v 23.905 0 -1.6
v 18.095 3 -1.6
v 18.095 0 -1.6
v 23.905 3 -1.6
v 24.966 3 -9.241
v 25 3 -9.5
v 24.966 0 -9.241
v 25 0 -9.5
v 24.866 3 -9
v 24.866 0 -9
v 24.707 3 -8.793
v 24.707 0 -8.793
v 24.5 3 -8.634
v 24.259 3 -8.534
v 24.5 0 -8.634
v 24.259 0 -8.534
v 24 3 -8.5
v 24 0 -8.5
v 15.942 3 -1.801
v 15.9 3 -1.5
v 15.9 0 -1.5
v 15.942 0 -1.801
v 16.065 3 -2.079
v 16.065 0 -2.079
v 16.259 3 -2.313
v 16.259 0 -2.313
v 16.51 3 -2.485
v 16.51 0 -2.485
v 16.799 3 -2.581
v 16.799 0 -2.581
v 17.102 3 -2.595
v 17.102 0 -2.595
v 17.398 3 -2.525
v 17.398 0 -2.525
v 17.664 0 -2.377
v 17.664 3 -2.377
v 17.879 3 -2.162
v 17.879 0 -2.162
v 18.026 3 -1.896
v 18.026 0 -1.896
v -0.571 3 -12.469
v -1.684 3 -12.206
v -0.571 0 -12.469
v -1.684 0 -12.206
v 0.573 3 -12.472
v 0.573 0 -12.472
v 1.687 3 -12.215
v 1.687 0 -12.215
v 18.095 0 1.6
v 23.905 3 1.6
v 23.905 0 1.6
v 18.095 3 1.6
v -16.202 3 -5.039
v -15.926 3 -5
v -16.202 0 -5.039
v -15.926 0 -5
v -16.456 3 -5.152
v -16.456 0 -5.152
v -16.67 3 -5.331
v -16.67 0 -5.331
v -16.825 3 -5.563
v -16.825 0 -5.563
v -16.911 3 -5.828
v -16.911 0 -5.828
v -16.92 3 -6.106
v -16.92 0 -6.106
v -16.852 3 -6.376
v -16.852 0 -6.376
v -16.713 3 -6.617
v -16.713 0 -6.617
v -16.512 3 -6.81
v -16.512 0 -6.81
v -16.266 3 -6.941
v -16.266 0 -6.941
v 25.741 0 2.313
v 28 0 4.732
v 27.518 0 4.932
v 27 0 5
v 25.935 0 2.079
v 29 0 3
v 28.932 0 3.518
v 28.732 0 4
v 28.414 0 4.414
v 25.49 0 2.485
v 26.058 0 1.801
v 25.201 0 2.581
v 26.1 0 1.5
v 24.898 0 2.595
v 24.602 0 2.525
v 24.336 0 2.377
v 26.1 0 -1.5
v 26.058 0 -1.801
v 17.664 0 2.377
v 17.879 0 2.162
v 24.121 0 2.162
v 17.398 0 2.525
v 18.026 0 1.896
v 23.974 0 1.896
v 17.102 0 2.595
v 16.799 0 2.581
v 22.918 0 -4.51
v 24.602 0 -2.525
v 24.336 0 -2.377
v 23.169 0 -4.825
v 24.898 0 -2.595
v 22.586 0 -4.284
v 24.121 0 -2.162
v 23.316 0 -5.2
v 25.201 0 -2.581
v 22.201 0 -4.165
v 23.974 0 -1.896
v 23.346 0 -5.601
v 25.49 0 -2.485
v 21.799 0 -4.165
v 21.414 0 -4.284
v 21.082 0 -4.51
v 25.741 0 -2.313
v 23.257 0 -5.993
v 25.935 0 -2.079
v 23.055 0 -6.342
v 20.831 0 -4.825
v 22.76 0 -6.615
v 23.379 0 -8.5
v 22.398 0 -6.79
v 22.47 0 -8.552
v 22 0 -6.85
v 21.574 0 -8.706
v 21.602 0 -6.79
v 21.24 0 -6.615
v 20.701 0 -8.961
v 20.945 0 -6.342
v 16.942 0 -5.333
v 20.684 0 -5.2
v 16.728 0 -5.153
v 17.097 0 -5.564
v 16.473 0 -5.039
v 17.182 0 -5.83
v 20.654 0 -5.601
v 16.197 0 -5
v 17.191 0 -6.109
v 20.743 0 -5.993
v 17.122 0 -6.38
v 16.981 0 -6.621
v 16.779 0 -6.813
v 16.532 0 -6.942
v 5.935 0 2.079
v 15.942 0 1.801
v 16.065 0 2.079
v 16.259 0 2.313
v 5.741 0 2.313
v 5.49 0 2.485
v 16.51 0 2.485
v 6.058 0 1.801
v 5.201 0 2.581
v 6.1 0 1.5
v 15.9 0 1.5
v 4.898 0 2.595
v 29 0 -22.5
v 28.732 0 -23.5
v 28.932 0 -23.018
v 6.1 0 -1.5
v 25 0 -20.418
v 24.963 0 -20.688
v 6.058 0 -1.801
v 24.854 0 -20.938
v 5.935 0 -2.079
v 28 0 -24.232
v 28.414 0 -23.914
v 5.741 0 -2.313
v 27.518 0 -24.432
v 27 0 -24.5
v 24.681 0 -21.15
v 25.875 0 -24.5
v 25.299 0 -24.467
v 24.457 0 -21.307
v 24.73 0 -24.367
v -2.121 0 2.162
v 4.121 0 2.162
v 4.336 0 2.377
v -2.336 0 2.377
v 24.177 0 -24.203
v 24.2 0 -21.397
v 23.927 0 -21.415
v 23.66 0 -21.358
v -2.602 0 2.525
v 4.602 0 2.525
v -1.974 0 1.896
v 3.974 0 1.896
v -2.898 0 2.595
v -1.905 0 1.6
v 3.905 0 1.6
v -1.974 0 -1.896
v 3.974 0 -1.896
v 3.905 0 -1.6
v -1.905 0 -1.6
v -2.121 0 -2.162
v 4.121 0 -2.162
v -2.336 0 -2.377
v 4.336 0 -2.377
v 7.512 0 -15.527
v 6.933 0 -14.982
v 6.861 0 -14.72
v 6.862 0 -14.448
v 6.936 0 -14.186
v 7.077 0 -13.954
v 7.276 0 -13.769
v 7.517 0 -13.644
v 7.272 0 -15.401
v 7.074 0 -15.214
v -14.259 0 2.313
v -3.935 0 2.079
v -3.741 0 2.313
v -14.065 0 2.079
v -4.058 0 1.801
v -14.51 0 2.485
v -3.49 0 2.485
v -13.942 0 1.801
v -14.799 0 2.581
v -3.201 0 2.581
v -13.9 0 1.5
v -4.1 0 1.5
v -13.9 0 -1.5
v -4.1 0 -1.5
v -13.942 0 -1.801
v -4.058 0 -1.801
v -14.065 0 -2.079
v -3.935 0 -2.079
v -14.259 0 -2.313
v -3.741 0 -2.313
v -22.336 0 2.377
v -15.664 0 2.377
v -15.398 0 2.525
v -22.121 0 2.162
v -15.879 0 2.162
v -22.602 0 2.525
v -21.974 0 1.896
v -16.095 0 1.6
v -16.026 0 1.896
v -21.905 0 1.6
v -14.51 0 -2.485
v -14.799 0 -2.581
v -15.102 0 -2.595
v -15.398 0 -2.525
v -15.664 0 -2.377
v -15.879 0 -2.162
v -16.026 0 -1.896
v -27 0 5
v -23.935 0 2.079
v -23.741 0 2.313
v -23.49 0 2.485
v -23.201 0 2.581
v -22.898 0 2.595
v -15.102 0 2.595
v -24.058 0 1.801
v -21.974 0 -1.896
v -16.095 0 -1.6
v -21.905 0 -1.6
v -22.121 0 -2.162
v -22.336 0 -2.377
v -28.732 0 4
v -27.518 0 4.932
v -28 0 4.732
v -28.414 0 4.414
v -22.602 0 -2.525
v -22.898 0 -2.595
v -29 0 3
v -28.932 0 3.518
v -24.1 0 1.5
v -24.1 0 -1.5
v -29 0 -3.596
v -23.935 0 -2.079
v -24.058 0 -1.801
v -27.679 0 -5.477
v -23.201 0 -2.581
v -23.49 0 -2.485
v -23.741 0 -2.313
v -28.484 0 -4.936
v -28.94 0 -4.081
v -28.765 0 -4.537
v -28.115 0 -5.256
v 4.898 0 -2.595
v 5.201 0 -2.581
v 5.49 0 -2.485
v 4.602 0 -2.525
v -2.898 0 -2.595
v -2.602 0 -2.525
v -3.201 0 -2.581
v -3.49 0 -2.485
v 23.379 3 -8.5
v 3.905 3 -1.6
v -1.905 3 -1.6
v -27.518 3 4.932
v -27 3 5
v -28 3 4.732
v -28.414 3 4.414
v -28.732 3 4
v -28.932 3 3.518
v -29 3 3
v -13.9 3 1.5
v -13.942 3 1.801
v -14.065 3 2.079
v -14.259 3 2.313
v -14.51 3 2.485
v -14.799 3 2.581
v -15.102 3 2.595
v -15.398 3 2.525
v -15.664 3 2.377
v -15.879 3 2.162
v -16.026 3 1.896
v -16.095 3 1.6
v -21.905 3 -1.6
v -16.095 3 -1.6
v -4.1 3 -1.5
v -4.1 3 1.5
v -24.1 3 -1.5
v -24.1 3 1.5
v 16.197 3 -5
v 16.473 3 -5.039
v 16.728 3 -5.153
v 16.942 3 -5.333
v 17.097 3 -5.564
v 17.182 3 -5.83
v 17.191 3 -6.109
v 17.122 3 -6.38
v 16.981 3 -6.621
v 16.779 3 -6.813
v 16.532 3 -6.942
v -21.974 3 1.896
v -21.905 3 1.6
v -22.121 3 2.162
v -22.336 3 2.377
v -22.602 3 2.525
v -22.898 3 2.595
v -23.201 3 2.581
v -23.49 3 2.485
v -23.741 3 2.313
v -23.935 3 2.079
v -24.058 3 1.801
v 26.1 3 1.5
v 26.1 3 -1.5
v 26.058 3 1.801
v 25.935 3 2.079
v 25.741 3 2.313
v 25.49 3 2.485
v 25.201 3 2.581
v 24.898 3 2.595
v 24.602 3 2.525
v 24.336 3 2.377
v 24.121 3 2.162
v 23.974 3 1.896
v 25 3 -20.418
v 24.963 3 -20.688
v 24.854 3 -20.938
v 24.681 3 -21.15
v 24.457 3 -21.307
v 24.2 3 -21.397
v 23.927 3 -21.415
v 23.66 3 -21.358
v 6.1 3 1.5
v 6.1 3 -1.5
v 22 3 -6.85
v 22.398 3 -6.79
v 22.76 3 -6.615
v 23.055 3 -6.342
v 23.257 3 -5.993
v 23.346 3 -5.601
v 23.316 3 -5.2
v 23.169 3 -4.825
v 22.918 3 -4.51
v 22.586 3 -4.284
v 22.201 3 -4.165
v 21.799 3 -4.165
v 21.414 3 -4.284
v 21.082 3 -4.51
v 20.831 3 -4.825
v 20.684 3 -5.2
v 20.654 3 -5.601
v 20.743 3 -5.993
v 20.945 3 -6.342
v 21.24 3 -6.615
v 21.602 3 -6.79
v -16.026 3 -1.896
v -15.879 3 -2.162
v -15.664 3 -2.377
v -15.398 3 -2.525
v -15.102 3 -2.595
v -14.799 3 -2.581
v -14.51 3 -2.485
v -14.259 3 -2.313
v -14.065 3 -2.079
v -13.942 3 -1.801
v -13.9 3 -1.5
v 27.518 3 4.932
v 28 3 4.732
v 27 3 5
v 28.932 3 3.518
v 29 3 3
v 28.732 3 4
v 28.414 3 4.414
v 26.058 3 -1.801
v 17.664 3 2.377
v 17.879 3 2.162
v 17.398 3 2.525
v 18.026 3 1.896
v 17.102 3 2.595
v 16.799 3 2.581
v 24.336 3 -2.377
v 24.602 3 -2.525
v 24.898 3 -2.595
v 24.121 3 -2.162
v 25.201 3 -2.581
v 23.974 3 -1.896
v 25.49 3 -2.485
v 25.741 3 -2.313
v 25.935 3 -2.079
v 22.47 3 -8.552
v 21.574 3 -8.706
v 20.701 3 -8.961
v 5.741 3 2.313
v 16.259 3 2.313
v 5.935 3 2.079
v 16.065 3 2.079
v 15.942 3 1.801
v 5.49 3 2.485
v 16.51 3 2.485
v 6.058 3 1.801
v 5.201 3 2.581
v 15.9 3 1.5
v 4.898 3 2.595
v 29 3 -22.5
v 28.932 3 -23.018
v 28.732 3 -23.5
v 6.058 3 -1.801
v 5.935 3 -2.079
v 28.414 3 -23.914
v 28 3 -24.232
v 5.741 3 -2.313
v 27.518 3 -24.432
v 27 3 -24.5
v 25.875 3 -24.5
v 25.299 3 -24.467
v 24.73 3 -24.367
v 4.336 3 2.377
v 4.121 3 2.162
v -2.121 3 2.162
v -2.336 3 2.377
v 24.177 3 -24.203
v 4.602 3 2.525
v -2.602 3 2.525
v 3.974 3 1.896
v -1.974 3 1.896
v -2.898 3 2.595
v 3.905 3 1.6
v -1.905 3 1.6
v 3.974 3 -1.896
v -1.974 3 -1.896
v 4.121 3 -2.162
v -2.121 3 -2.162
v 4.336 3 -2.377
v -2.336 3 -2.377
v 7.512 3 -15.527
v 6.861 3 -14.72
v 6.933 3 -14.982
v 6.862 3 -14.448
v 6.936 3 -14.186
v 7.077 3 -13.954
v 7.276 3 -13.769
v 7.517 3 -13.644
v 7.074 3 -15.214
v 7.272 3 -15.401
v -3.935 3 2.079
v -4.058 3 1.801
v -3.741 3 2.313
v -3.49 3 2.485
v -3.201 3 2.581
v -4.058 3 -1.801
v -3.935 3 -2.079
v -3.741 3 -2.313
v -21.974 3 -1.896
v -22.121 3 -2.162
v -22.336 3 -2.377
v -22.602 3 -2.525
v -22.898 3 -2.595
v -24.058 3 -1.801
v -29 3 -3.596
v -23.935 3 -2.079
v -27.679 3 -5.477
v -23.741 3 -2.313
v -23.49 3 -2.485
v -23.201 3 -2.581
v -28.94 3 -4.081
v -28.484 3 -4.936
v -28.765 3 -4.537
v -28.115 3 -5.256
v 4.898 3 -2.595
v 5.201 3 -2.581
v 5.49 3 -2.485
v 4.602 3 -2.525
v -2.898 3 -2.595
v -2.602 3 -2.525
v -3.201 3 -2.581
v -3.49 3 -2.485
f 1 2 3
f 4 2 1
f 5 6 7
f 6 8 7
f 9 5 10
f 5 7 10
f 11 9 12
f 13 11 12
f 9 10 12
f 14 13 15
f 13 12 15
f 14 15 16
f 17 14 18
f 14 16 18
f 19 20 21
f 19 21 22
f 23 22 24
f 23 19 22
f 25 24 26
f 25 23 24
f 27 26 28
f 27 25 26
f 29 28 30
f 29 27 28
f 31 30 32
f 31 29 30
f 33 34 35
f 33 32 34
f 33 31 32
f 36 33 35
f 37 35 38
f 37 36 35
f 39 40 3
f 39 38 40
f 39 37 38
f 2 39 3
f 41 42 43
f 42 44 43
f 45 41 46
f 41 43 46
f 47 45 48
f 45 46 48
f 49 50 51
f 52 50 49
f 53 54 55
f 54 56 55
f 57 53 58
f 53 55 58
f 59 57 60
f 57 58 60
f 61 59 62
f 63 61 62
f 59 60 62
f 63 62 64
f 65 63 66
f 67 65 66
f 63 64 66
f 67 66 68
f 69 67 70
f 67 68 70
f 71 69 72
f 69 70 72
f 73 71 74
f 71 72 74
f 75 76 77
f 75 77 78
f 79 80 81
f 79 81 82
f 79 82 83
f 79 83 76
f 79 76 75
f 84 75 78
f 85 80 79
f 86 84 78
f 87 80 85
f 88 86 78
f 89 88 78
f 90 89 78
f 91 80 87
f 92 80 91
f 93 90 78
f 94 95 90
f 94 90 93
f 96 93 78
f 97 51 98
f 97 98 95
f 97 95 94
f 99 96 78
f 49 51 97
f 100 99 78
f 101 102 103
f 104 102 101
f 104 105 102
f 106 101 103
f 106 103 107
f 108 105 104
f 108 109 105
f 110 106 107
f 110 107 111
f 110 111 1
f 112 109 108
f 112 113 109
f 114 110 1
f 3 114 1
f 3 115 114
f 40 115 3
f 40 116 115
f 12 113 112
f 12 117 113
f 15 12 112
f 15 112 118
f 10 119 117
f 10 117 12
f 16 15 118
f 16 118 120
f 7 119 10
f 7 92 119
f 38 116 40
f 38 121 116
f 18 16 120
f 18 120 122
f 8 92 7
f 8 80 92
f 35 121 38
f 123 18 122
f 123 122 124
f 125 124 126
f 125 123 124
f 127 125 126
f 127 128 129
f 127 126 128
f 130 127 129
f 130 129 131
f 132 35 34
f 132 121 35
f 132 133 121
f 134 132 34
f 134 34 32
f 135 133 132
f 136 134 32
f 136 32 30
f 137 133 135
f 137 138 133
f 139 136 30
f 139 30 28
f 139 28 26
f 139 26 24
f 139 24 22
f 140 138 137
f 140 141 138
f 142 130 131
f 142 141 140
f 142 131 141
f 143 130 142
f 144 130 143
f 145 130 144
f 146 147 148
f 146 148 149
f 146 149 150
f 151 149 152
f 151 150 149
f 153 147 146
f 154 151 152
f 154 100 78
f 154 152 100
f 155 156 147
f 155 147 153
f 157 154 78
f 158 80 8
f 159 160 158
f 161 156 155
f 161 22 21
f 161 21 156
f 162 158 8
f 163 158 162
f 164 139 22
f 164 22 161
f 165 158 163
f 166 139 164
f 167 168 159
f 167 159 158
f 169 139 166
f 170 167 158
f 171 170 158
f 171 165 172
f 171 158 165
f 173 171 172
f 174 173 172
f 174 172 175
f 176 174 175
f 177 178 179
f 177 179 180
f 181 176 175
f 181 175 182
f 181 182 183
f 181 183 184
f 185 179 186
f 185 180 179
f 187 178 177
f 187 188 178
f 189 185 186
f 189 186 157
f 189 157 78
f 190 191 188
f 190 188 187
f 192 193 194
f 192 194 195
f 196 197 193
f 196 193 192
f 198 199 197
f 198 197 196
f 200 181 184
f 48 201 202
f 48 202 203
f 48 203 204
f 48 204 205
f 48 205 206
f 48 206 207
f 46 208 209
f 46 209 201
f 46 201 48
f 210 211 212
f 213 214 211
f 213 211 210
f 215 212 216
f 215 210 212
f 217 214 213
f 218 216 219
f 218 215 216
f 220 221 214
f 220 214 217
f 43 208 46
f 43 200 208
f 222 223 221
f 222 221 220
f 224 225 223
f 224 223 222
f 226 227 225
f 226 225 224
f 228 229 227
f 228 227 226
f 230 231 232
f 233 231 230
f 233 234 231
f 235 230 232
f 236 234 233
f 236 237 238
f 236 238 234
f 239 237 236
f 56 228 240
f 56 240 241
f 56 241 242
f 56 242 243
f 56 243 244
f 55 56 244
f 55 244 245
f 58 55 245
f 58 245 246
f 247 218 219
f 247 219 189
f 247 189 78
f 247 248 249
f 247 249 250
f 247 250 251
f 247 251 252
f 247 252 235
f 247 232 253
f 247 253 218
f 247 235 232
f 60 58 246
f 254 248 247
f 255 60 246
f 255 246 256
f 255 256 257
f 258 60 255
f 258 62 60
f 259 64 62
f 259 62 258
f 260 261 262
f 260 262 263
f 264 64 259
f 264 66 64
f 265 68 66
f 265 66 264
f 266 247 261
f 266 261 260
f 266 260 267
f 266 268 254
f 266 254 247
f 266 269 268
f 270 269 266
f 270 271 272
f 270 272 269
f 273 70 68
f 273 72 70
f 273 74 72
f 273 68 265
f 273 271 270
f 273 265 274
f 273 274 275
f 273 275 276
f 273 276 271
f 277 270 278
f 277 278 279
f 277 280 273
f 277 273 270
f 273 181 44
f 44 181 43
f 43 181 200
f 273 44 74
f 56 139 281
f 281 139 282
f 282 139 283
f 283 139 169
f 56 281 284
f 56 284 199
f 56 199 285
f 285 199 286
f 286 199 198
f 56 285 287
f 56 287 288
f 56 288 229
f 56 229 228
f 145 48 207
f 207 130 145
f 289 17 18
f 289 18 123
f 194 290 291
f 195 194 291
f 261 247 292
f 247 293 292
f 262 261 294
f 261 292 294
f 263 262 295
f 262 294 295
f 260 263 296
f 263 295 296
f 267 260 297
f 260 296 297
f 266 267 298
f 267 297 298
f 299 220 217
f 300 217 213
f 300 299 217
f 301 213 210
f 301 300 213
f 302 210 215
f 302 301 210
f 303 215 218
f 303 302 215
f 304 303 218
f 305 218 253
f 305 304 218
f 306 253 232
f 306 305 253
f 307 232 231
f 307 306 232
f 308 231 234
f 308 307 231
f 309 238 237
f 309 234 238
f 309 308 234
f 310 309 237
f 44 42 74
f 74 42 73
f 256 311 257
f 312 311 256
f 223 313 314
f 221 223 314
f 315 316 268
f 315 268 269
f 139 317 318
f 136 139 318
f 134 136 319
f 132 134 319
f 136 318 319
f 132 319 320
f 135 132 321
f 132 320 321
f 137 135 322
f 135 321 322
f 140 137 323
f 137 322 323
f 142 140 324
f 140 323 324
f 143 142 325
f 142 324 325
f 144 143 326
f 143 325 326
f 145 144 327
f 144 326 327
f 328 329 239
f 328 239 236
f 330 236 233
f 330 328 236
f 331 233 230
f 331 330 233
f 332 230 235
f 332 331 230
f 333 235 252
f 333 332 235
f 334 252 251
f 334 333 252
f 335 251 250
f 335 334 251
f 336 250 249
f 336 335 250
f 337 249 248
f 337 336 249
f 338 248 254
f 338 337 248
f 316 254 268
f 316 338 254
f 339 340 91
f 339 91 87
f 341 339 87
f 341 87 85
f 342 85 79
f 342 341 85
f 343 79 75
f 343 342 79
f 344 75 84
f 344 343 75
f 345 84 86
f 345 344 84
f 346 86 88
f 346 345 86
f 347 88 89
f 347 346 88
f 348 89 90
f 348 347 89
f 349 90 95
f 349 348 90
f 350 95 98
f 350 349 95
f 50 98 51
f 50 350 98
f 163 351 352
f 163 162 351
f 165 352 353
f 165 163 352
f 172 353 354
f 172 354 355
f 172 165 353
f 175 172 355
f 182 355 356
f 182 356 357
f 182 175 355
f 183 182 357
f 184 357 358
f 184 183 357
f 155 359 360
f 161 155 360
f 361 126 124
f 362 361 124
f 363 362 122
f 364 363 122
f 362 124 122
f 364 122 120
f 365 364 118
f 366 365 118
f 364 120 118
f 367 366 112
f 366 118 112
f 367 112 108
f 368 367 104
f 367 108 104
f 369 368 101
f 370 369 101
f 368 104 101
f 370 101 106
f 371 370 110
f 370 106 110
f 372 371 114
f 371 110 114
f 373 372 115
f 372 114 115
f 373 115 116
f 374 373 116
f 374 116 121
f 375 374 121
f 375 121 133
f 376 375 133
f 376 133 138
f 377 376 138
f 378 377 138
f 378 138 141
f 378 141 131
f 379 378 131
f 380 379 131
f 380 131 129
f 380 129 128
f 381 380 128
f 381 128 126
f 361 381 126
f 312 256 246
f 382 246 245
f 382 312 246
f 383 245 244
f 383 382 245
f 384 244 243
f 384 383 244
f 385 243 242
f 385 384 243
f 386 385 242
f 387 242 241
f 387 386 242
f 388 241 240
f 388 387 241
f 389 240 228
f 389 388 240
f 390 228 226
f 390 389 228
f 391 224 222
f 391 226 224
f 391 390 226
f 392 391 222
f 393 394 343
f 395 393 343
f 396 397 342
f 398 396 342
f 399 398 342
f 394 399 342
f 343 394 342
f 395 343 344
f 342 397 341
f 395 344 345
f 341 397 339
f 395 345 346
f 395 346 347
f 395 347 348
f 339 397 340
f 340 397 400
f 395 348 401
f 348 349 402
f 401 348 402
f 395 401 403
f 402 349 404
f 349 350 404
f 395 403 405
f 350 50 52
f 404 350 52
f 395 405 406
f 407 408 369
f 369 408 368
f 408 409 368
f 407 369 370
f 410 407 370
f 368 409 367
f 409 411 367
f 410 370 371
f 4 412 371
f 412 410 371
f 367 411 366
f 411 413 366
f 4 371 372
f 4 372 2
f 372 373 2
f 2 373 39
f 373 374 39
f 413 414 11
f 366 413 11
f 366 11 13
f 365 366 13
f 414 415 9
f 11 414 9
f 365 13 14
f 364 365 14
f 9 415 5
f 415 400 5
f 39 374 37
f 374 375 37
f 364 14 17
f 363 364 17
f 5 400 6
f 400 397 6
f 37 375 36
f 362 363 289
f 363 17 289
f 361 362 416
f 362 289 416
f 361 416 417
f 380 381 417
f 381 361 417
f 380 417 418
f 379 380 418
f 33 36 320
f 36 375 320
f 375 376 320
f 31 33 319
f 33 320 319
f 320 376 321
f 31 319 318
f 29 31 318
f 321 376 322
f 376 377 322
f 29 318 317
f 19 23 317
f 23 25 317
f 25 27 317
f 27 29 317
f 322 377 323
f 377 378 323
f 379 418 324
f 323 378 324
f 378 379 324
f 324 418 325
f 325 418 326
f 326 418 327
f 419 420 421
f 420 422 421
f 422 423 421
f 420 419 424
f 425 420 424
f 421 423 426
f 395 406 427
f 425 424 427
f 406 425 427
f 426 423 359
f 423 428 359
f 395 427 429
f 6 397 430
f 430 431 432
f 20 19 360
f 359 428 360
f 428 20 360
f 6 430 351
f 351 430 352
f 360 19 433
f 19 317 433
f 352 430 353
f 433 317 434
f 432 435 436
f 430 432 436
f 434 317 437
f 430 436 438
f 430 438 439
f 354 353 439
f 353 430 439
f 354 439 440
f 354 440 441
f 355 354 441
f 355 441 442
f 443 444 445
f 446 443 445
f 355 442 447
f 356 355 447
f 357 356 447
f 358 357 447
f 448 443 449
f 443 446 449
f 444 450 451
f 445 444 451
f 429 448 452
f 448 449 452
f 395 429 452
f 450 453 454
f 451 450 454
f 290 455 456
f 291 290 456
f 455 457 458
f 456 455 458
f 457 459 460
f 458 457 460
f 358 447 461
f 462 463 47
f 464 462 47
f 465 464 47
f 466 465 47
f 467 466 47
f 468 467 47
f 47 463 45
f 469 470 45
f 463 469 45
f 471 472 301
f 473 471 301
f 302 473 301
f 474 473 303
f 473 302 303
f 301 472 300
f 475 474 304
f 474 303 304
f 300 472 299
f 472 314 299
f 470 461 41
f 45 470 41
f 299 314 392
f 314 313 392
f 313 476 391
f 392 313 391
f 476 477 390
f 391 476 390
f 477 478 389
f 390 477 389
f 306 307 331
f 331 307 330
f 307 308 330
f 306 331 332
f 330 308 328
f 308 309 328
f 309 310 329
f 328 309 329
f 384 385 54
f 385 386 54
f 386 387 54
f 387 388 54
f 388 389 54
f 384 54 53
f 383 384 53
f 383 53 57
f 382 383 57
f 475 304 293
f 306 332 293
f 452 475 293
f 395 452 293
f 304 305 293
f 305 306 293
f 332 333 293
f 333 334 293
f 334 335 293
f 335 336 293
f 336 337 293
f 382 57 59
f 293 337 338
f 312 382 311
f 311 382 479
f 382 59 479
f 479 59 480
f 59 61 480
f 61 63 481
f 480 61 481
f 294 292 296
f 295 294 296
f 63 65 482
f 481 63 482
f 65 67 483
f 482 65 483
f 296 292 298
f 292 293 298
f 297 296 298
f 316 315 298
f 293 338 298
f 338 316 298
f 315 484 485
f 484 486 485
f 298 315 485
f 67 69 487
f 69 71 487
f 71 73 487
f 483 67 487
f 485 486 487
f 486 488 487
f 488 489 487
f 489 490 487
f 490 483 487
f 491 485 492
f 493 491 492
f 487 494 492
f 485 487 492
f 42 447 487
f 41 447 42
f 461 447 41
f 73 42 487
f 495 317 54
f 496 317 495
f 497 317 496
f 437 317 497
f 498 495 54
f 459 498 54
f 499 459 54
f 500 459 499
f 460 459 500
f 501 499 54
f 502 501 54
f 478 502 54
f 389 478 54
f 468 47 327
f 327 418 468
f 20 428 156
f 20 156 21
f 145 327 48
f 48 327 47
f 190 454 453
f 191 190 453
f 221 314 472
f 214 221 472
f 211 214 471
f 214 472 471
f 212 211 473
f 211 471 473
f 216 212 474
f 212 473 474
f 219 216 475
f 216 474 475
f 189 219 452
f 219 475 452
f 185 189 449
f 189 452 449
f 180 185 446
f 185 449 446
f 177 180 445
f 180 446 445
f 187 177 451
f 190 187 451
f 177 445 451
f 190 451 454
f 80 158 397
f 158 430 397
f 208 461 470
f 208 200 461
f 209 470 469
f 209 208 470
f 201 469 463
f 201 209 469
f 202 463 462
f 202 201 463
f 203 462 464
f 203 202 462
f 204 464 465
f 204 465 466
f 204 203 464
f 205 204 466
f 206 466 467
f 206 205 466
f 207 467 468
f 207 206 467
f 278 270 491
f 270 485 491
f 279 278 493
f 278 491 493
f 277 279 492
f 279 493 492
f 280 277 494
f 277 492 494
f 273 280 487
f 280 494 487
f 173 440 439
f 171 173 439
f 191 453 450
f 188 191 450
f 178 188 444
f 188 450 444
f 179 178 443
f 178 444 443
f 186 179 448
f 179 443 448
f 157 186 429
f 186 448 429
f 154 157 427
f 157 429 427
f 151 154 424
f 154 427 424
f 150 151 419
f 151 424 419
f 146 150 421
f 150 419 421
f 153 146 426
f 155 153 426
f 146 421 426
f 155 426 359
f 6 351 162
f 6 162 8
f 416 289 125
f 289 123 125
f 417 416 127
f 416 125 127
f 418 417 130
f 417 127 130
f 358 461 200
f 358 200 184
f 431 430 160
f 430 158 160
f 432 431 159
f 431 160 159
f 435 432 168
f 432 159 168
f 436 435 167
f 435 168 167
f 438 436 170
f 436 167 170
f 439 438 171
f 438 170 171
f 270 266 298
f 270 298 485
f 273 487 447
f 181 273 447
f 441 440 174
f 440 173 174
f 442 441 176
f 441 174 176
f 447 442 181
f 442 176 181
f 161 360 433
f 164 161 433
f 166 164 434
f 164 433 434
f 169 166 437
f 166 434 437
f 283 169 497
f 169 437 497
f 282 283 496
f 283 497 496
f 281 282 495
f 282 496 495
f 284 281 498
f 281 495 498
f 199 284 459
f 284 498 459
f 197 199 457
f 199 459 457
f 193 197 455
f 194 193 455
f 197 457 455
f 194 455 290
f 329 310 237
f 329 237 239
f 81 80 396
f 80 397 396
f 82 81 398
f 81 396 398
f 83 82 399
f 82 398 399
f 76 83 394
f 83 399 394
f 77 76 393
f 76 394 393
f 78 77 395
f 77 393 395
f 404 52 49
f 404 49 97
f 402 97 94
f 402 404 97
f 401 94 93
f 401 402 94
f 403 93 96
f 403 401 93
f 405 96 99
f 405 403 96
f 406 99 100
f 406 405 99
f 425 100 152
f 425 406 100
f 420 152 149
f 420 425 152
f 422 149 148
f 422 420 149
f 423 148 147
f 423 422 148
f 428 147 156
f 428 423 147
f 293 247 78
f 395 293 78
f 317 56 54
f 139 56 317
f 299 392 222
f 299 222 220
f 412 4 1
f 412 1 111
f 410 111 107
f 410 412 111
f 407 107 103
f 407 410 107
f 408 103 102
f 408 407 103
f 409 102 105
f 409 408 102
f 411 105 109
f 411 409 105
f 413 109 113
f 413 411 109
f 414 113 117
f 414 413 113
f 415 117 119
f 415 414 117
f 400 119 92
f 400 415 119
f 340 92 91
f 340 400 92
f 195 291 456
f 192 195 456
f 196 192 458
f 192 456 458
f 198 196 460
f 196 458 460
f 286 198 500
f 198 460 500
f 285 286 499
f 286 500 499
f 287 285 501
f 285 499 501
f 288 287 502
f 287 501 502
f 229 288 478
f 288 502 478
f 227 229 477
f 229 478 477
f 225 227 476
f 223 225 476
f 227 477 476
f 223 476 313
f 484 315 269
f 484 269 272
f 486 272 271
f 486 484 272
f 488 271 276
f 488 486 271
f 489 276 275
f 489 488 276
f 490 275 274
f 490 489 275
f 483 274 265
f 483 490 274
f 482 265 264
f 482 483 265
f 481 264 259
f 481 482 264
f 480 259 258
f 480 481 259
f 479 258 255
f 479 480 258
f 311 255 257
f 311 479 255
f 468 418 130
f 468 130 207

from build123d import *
from OCP.BRepFilletAPI import BRepFilletAPI_MakeFillet

# Parameters (mm, degrees)
SKETCH_1_W          = 58
SKETCH_1_H          = 10
EXTRUDE_1_DEPTH     = 3
SKETCH_3_W          = 10
SKETCH_3_H          = 3
CUT_EXTRUDE_2_DEPTH = 30.580398915
EXTRUDE_2_DEPTH     = 3
SKETCH_5_R          = 1
SKETCH_5_R_2        = 1.35
CUT_EXTRUDE_3_DEPTH = 39.082148049
CUT_EXTRUDE_5_DEPTH = 39.082148049
FILLET_1_R          = 1
FILLET_2_R          = 2
FILLET_3_R1         = 5
FILLET_3_R2         = 8


with BuildPart() as part:
    # 草图1 → 凸台-拉伸1 (new body)
    with BuildSketch(Plane(origin=(0, 0, 0), x_dir=(1, 0, 0), z_dir=(0, 1, 0))):
        Rectangle(SKETCH_1_W, SKETCH_1_H)
    extrude(amount=EXTRUDE_1_DEPTH)

    # 草图3 → 切除-拉伸2 (cut, through all)
    with BuildSketch(Plane.XZ):
        with Locations((-19, 0)):
            Rectangle(SKETCH_3_W, SKETCH_3_H)
        with Locations((1, 0)):
            Rectangle(SKETCH_3_W, SKETCH_3_H)
        with Locations((21, 0)):
            Rectangle(SKETCH_3_W, SKETCH_3_H)
    extrude(amount=-CUT_EXTRUDE_2_DEPTH, mode=Mode.SUBTRACT)

    # 草图9 → 凸台-拉伸2 (add)
    with BuildSketch(Plane(origin=(0, 3, 0), x_dir=(1, 0, 0), z_dir=(0, 1, 0))):
        with BuildLine():
            Line((29, 24.5), (29, 5))
            Line((29, 5), (22, 5))
            Line((22, 5), (16.19691326, 5))
            ThreePointArc((16.19691326, 5), (17.182388504, 5.830180852), (16.531618392, 6.942322914))
            Line((16.531618392, 6.942322914), (0, 12.814213999))
            Line((0, 12.814213999), (-21.639361843, 5))
            Line((-21.639361843, 5), (-29, 5))
            Line((-29, 5), (25, 24.5))
            Line((25, 24.5), (29, 24.5))
        make_face()
        Polygon((25, 21.841991777), (25, 8.5), (22, 8.5), (4.886202736, 14.578676098), align=None, mode=Mode.SUBTRACT)
    extrude(amount=-EXTRUDE_2_DEPTH)

    # 草图5 → 切除-拉伸3 (cut, through all)
    with BuildSketch(Plane.XZ):
        with Locations((-23, 1.5)):
            Circle(SKETCH_5_R)
        with Locations((-15, 1.5)):
            Circle(SKETCH_5_R)
        with Locations((-15, -1.5)):
            Circle(SKETCH_5_R)
        with Locations((-23, -1.5)):
            Circle(SKETCH_5_R)
        with Locations((-3, -1.5)):
            Circle(SKETCH_5_R)
        with Locations((5, -1.5)):
            Circle(SKETCH_5_R)
        with Locations((-3, 1.5)):
            Circle(SKETCH_5_R)
        with Locations((5, 1.5)):
            Circle(SKETCH_5_R)
        with Locations(Location((22, -5.5, 0), (0, 0, 270))):
            Circle(SKETCH_5_R_2)
        with Locations((25, -1.5)):
            Circle(SKETCH_5_R)
        with Locations((17, -1.5)):
            Circle(SKETCH_5_R)
        with Locations((17, 1.5)):
            Circle(SKETCH_5_R)
        with Locations((25, 1.5)):
            Circle(SKETCH_5_R)
    extrude(amount=-CUT_EXTRUDE_3_DEPTH, mode=Mode.SUBTRACT)

    # 草图8 → 切除-拉伸5 (cut, through all)
    with BuildSketch(Plane(origin=(0, 3, 0), x_dir=(1, 0, 0), z_dir=(0, 1, 0))):
        with BuildLine():
            Line((6.1, -1.5), (6.1, 1.5))
            ThreePointArc((6.1, 1.5), (5.050051841, 2.598860689), (3.904554885, 1.6))
            Line((3.904554885, 1.6), (-1.904554885, 1.6))
            ThreePointArc((-1.904554885, 1.6), (-3.050051841, 2.598860689), (-4.1, 1.5))
            Line((-4.1, 1.5), (-4.1, -1.5))
            ThreePointArc((-4.1, -1.5), (-3.050051841, -2.598860689), (-1.904554885, -1.6))
            Line((-1.904554885, -1.6), (3.904554885, -1.6))
            ThreePointArc((3.904554885, -1.6), (5.050051841, -2.598860689), (6.1, -1.5))
        make_face()
        with BuildLine():
            Line((-16.095445115, -1.6), (-21.904554885, -1.6))
            ThreePointArc((-21.904554885, -1.6), (-23.050051841, -2.598860689), (-24.1, -1.5))
            Line((-24.1, -1.5), (-24.1, 1.5))
            ThreePointArc((-24.1, 1.5), (-23.050051841, 2.598860689), (-21.904554885, 1.6))
            Line((-21.904554885, 1.6), (-16.095445115, 1.6))
            ThreePointArc((-16.095445115, 1.6), (-14.949948159, 2.598860689), (-13.9, 1.5))
            Line((-13.9, 1.5), (-13.9, -1.5))
            ThreePointArc((-13.9, -1.5), (-14.949948159, -2.598860689), (-16.095445115, -1.6))
        make_face()
        with BuildLine():
            Line((23.904554885, -1.6), (18.095445115, -1.6))
            ThreePointArc((18.095445115, -1.6), (16.949948159, -2.598860689), (15.9, -1.5))
            Line((15.9, -1.5), (15.9, 1.5))
            ThreePointArc((15.9, 1.5), (16.949948159, 2.598860689), (18.095445115, 1.6))
            Line((18.095445115, 1.6), (23.904554885, 1.6))
            ThreePointArc((23.904554885, 1.6), (25.050051841, 2.598860689), (26.1, 1.5))
            Line((26.1, 1.5), (26.1, -1.5))
            ThreePointArc((26.1, -1.5), (25.050051841, -2.598860689), (23.904554885, -1.6))
        make_face()
    extrude(amount=-CUT_EXTRUDE_5_DEPTH, mode=Mode.SUBTRACT)

    # 圆角1
    fillet_1_edges = [part.edges().sort_by_distance(p)[0] for p in [
        (-21.639361843, 1.5, -5),
        (25, 1.5, -21.841991777),
        (25, 1.5, -8.5),
        (4.886202736, 1.5, -14.578676098),
    ]]
    fillet(fillet_1_edges, radius=FILLET_1_R)

    # 圆角2
    fillet_2_edges = [part.edges().sort_by_distance(p)[0] for p in [
        (29, 1.5, -24.5),
        (29, 1.5, 5),
        (-29, 1.5, 5),
        (-29, 1.5, -5),
    ]]
    fillet(fillet_2_edges, radius=FILLET_2_R)

    # 圆角3: one fillet with a radius per group of edges: ONE call of the kernel's fillet builder (fillet() takes one radius for all edges)
    fillet_3_edges_1 = [part.edges().sort_by_distance(p)[0] for p in [
        (0, 1.5, -12.814213999),
        (25, 1.5, -24.5),
    ]]
    fillet_3_edges_2 = [part.edges().sort_by_distance(p)[0] for p in [
        (22, 1.5, -8.5),
    ]]
    fillet_3 = BRepFilletAPI_MakeFillet(part.part.solid().wrapped)
    for e in fillet_3_edges_1:
        fillet_3.Add(FILLET_3_R1, e.wrapped)
    for e in fillet_3_edges_2:
        fillet_3.Add(FILLET_3_R2, e.wrapped)
    add(Compound.cast(fillet_3.Shape()), mode=Mode.REPLACE)


solid = part.part
